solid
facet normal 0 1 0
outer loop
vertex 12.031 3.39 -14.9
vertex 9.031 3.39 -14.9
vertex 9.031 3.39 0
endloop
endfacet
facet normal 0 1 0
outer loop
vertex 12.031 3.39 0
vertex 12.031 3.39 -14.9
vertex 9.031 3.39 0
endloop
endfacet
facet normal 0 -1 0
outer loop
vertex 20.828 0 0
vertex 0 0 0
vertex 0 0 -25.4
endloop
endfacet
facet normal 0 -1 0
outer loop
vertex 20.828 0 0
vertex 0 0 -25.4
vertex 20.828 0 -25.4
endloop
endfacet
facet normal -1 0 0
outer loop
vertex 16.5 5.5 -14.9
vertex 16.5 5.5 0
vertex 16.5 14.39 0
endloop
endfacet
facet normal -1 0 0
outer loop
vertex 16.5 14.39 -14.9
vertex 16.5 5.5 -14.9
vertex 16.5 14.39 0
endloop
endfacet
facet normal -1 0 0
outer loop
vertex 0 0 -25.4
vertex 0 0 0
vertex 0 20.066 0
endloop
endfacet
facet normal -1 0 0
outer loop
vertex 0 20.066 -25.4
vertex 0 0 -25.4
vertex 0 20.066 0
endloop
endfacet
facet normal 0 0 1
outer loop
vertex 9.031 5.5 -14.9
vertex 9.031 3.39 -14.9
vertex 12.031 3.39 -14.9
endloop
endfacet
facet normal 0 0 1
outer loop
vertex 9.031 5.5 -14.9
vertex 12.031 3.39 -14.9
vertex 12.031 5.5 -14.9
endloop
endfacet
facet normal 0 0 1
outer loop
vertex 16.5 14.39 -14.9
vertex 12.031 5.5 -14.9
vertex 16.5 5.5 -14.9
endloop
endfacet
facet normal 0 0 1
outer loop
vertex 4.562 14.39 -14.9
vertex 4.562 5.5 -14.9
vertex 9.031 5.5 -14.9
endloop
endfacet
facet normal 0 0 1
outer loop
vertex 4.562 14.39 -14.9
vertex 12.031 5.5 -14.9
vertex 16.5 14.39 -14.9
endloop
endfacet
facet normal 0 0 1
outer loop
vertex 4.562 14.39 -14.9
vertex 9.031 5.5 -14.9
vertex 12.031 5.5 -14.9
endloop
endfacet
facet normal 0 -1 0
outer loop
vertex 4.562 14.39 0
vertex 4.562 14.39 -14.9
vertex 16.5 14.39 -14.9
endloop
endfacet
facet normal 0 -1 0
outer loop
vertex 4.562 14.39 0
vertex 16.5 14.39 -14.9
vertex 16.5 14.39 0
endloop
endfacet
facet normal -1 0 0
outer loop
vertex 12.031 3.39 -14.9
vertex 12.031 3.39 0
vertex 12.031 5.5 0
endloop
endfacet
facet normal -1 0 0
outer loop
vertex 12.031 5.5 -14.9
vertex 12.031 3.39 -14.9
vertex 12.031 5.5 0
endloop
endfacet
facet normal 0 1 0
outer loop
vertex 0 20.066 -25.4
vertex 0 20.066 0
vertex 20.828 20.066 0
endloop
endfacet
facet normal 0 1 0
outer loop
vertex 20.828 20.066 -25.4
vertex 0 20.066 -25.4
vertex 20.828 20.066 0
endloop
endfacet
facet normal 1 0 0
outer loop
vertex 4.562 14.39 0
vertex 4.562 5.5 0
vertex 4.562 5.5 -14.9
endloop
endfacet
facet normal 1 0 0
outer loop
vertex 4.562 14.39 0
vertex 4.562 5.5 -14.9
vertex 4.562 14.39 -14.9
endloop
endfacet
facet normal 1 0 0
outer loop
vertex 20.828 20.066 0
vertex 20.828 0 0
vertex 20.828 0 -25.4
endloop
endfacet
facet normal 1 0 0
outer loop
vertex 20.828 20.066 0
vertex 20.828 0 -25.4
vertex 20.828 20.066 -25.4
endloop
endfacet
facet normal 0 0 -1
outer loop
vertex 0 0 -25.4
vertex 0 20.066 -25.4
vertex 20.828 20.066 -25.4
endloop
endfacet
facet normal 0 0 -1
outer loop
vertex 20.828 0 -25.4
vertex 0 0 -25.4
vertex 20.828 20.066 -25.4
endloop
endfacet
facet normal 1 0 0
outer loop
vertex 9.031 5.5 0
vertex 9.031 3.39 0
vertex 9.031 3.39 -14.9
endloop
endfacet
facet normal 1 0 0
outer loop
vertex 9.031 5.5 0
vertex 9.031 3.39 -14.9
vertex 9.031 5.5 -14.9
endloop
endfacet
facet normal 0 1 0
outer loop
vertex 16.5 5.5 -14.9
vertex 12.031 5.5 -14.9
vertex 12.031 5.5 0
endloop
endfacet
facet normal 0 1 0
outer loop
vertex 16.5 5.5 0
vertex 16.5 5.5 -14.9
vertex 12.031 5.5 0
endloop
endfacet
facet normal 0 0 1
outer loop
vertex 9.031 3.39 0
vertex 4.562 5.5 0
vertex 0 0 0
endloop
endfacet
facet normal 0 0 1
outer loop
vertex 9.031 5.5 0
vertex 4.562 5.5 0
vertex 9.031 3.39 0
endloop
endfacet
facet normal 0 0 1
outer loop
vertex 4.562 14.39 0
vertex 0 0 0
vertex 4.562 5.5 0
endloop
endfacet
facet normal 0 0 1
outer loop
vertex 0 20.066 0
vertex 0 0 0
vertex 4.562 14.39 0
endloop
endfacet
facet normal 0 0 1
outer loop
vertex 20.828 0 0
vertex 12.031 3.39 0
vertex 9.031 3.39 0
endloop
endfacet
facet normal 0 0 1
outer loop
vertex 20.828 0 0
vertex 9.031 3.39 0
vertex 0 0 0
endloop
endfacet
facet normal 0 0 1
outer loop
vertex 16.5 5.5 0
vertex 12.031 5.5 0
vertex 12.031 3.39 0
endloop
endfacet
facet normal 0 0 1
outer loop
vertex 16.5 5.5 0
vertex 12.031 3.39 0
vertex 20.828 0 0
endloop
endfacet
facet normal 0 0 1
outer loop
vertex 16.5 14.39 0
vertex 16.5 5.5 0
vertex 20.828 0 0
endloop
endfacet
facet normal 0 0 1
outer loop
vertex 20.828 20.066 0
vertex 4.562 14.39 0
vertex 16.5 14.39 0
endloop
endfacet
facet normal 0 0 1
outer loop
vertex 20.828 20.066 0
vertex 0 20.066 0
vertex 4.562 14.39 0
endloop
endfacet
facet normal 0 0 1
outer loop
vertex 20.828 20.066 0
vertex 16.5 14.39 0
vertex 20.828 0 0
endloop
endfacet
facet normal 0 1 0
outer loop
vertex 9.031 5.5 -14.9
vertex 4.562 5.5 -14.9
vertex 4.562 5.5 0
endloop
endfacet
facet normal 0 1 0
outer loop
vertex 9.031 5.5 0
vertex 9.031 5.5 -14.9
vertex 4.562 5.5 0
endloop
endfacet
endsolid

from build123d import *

# Parameters (mm, degrees)
SKETCH1_W           = 20.828
SKETCH1_H           = 20.066
BOSS_EXTRUDE1_DEPTH = 25.4
CAVITY1_START       = 4.562
CAVITY1_OUTLINE_W   = 8.89
CAVITY1_OUTLINE_H   = 14.9
CAVITY1_DEPTH       = 11.938
CAVITY1_START_2     = 9.031
CAVITY1_2_OUTLINE_W = 2.11
CAVITY1_2_OUTLINE_H = 14.9
CAVITY1_2_DEPTH     = 3


# Read off the part's stored shape, not the designer's step: Cavity1
with BuildPart() as part:
    # Sketch1 → Boss-Extrude1 (new body)
    with BuildSketch(Plane.XY):
        with Locations((10.414, 10.033)):
            Rectangle(SKETCH1_W, SKETCH1_H)
    extrude(amount=-BOSS_EXTRUDE1_DEPTH)

    # Cavity1 outline → Cavity1 (cut)
    with BuildSketch(Plane.YZ.offset(CAVITY1_START)):
        with Locations((9.945, -7.45)):
            Rectangle(CAVITY1_OUTLINE_W, CAVITY1_OUTLINE_H)
    extrude(amount=CAVITY1_DEPTH, mode=Mode.SUBTRACT)

    # Cavity1 2 outline → Cavity1 2 (cut)
    with BuildSketch(Plane.YZ.offset(CAVITY1_START_2)):
        with Locations((4.445, -7.45)):
            Rectangle(CAVITY1_2_OUTLINE_W, CAVITY1_2_OUTLINE_H)
    extrude(amount=CAVITY1_2_DEPTH, mode=Mode.SUBTRACT)


solid = part.part
